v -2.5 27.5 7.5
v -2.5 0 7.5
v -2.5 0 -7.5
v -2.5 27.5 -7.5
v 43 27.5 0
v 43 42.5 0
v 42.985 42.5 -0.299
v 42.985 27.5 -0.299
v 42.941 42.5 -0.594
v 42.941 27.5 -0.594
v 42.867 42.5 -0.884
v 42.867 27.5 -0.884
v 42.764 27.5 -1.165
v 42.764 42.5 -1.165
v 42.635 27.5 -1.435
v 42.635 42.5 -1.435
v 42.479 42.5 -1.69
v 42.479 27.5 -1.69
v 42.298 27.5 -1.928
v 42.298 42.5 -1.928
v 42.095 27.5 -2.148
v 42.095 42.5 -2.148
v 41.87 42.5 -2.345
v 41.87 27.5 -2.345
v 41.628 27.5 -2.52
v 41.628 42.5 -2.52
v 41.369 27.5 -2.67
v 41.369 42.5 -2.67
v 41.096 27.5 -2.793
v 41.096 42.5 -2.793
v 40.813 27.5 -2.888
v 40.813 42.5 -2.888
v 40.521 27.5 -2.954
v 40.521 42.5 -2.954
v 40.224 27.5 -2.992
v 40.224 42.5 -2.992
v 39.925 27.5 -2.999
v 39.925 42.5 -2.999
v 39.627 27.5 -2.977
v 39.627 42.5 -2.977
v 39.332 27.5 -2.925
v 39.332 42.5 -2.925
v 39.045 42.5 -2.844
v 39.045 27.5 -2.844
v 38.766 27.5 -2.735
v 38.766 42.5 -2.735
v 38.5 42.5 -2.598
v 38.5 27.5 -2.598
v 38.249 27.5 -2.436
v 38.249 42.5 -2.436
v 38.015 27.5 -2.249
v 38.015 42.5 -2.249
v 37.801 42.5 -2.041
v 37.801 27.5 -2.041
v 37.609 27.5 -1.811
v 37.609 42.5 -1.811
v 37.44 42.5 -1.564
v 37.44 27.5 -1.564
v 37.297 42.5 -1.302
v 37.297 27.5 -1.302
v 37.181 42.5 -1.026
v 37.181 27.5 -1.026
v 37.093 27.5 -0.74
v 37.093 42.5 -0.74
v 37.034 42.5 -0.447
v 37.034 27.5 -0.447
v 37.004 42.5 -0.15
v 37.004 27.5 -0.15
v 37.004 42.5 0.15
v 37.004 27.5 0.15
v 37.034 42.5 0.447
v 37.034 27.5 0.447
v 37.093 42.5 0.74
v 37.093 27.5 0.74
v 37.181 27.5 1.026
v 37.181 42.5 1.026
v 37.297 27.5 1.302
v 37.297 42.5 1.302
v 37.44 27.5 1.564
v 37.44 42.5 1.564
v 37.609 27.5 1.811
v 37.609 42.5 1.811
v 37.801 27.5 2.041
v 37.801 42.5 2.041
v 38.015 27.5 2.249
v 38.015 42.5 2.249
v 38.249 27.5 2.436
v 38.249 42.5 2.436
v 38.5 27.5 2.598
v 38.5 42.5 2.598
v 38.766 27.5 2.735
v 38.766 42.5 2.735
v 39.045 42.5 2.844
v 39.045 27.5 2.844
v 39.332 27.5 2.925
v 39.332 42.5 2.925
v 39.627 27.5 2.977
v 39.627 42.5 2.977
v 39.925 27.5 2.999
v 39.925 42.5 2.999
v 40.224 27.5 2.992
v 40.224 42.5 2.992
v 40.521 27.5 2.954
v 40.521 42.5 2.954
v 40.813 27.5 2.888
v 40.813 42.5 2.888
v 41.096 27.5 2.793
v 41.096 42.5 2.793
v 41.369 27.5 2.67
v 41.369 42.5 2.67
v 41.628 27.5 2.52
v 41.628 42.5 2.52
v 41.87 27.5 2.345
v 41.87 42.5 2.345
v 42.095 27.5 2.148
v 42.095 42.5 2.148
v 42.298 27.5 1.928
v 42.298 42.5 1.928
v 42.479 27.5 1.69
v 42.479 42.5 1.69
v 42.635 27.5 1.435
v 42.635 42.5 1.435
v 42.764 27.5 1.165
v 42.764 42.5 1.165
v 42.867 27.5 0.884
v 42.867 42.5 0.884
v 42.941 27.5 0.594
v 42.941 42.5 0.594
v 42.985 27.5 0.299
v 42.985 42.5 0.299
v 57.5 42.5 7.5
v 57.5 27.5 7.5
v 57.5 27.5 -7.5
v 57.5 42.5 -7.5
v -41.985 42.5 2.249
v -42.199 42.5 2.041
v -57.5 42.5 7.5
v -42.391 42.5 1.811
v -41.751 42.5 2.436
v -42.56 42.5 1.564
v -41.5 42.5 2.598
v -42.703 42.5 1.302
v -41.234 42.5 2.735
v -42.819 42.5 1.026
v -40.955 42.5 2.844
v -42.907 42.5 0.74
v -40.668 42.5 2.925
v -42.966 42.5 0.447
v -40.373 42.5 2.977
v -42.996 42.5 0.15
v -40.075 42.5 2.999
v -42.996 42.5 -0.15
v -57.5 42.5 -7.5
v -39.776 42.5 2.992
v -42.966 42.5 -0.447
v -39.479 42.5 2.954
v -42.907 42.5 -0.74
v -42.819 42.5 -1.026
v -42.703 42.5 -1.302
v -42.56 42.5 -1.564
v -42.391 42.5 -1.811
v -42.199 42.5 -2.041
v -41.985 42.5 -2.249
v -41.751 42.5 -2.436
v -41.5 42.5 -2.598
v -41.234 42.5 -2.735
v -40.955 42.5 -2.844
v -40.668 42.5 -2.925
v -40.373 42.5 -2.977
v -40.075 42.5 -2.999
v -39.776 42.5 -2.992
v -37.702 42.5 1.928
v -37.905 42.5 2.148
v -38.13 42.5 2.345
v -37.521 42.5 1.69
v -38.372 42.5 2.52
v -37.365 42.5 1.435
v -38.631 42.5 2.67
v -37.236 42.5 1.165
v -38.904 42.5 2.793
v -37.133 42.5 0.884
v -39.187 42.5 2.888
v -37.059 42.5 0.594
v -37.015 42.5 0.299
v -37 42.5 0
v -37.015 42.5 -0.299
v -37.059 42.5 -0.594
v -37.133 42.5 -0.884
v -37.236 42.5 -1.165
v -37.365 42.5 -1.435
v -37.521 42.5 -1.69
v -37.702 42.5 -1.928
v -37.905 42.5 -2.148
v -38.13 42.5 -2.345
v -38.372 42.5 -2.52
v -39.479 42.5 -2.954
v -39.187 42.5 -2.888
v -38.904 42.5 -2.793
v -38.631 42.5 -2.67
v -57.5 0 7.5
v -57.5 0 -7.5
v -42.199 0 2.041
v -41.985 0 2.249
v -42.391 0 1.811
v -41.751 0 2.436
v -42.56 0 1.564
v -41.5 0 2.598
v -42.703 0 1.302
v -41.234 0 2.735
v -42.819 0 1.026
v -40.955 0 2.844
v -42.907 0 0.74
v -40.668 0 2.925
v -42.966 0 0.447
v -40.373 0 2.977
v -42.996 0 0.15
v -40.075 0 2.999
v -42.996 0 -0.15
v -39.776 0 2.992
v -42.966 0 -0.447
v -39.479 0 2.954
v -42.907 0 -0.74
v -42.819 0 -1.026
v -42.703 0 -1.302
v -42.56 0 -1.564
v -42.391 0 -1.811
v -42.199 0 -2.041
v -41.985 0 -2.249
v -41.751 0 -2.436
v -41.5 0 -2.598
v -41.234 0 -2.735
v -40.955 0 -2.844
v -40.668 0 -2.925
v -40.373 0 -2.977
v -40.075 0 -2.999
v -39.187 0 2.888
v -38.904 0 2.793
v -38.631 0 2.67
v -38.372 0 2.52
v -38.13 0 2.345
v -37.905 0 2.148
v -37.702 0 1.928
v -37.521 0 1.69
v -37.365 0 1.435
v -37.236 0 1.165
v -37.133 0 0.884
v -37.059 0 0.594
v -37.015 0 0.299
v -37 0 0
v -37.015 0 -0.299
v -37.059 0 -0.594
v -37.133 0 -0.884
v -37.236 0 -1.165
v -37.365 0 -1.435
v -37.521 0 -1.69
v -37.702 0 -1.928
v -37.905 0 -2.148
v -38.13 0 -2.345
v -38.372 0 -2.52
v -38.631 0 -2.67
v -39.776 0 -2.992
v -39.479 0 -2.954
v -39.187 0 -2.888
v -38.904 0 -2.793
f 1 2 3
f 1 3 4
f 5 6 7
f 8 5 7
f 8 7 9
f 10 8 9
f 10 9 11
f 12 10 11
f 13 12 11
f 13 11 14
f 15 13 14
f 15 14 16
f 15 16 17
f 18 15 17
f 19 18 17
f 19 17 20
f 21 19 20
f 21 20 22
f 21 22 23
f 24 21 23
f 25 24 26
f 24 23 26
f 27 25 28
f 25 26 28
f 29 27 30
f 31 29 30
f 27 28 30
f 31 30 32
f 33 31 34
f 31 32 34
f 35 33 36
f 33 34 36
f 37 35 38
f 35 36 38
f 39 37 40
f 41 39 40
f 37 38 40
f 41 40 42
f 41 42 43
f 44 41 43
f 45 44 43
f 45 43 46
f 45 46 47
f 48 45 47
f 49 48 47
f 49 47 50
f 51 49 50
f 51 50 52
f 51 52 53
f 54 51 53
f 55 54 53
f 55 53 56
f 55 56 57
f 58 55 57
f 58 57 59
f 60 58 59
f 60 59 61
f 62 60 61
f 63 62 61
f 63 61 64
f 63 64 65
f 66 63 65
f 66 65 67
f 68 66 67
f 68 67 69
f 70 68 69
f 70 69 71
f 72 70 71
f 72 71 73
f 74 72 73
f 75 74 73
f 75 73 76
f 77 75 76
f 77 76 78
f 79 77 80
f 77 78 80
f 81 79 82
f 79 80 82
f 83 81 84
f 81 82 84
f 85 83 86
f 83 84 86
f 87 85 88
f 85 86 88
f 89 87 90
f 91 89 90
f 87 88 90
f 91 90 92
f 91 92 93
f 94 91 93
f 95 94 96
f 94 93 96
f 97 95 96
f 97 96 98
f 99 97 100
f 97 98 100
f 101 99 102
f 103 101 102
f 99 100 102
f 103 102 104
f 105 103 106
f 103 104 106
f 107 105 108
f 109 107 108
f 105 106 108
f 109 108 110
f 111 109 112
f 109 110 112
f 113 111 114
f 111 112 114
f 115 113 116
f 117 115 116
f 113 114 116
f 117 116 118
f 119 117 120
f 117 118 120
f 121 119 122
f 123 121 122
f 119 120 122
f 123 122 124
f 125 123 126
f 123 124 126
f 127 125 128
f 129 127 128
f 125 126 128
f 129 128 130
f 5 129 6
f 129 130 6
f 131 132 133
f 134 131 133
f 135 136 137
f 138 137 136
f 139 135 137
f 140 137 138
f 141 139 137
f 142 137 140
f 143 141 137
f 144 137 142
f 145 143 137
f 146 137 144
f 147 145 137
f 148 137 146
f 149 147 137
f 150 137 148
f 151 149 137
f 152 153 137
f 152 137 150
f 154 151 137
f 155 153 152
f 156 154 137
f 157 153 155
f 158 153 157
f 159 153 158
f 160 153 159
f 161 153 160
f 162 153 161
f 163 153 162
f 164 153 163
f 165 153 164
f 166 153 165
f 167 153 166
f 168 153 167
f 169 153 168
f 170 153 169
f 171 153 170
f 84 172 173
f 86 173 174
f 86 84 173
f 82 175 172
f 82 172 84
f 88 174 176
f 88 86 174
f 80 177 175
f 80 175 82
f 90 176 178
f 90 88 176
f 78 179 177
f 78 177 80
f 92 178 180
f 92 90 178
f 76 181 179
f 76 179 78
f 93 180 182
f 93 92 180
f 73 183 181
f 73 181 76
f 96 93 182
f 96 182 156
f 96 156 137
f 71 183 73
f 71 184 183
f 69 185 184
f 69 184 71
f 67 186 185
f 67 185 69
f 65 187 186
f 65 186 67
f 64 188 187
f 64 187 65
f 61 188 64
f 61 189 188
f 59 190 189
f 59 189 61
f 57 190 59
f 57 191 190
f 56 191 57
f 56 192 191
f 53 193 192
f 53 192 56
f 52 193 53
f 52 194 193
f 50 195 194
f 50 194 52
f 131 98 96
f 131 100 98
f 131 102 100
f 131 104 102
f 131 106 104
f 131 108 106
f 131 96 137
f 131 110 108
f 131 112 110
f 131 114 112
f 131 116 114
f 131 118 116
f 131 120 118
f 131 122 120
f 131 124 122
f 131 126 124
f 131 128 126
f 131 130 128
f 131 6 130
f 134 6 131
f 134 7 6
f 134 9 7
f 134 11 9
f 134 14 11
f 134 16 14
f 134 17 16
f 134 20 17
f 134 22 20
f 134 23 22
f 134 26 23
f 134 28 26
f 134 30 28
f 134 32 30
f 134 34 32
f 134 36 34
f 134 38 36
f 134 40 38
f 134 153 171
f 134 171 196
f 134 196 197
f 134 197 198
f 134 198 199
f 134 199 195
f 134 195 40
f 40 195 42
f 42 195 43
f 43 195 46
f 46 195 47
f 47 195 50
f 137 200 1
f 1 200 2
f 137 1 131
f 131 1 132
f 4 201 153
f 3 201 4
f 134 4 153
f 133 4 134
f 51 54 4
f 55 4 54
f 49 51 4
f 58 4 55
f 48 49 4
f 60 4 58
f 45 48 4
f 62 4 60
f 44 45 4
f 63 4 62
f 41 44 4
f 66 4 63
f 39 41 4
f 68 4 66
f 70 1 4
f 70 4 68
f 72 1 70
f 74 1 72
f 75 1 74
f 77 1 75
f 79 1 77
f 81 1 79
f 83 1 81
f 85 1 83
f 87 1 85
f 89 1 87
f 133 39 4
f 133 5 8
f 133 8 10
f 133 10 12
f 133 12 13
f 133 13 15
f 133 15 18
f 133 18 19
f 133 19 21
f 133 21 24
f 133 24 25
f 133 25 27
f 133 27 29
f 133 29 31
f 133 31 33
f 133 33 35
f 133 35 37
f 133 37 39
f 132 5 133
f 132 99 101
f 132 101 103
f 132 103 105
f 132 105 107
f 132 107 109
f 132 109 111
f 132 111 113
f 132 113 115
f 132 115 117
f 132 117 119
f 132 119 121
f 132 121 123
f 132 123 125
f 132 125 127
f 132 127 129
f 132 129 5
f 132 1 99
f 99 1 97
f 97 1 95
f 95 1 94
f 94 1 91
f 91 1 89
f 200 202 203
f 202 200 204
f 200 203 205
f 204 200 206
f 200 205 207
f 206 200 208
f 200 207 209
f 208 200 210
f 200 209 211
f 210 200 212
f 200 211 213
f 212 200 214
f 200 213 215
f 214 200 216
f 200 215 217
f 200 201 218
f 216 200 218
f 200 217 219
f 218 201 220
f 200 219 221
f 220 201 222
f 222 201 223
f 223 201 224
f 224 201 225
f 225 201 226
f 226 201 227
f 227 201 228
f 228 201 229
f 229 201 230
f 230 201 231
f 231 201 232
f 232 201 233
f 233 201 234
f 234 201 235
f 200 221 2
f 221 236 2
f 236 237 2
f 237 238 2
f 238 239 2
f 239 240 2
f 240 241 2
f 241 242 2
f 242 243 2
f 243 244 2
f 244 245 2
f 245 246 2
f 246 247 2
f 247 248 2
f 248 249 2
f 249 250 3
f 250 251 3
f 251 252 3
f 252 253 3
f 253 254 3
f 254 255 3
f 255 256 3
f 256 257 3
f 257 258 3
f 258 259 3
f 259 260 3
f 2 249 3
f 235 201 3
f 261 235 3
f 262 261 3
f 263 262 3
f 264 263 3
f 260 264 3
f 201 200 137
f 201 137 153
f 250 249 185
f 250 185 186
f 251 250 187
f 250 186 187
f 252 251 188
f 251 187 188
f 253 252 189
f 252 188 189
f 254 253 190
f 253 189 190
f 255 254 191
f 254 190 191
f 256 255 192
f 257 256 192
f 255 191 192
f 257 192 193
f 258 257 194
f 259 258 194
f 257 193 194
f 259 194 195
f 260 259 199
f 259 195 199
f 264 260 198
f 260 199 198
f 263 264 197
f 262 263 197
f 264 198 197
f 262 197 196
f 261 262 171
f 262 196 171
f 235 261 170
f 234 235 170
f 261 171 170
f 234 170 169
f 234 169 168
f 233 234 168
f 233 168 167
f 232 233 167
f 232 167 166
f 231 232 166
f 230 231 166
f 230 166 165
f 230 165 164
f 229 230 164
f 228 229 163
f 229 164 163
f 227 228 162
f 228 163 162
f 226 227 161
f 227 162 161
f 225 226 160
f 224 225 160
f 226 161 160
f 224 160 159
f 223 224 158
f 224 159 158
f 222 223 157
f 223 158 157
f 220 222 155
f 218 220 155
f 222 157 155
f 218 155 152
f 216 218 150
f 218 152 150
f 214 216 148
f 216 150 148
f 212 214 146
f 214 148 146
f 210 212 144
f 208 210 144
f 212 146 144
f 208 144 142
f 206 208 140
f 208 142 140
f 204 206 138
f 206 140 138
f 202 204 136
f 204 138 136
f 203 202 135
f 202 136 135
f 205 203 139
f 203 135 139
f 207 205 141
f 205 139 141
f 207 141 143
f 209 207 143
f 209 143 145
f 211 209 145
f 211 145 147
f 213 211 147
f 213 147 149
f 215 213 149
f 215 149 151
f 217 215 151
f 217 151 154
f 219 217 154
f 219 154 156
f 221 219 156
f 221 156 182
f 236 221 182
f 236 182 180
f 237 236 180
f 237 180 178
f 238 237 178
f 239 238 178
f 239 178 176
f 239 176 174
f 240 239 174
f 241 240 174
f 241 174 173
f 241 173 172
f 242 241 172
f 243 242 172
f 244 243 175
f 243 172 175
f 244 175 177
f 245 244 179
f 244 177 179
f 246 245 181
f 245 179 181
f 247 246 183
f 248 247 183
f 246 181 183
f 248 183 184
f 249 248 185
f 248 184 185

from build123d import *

# Parameters (mm, degrees)
SKETCH1_W                      = 115
SKETCH1_H                      = 15
BOSS_EXTRUDE1_DEPTH            = 42.5
SKETCH2_R                      = 3
CUT_EXTRUDE1_DEPTH             = 42.5
CUT_EXTRUDE2_REACH             = 17
SKETCH3_W                      = 60
SKETCH3_H                      = 27.5
CUT_EXTRUDE2_DIRECTION_2_DEPTH = 1


with BuildPart() as part:
    # Sketch1 → Boss-Extrude1 (new body)
    with BuildSketch(Plane(origin=(0, 0, 0), x_dir=(1, 0, 0), z_dir=(0, 1, 0))):
        Rectangle(SKETCH1_W, SKETCH1_H)
    extrude(amount=BOSS_EXTRUDE1_DEPTH)

    # Sketch2 → Cut-Extrude1 (cut)
    with BuildSketch(Plane(origin=(0, 42.5, 0), x_dir=(1, 0, 0), z_dir=(0, 1, 0))):
        with Locations((-40, 0)):
            Circle(SKETCH2_R)
        with Locations((40, 0)):
            Circle(SKETCH2_R)
    extrude(amount=-CUT_EXTRUDE1_DEPTH, mode=Mode.SUBTRACT)

    # Sketch3 → Cut-Extrude2 (cut, up to next)
    with BuildSketch(Plane.XY.offset(7.5), mode=Mode.PRIVATE) as cut_extrude2_sk1:
        with Locations((27.5, 13.75)):
            Rectangle(SKETCH3_W, SKETCH3_H)
    cut_extrude2_tool1 = extrude(cut_extrude2_sk1.sketch, amount=-CUT_EXTRUDE2_REACH, mode=Mode.PRIVATE) & part.part
    add(cut_extrude2_tool1.solids().sort_by_distance((27.5, 13.75, 7.5))[0], mode=Mode.SUBTRACT)

    # Sketch3 → Cut-Extrude2 direction 2 (cut)
    with BuildSketch(Plane.XY.offset(7.5)):
        with Locations((27.5, 13.75)):
            Rectangle(SKETCH3_W, SKETCH3_H)
    extrude(amount=CUT_EXTRUDE2_DIRECTION_2_DEPTH, mode=Mode.SUBTRACT)


solid = part.part
